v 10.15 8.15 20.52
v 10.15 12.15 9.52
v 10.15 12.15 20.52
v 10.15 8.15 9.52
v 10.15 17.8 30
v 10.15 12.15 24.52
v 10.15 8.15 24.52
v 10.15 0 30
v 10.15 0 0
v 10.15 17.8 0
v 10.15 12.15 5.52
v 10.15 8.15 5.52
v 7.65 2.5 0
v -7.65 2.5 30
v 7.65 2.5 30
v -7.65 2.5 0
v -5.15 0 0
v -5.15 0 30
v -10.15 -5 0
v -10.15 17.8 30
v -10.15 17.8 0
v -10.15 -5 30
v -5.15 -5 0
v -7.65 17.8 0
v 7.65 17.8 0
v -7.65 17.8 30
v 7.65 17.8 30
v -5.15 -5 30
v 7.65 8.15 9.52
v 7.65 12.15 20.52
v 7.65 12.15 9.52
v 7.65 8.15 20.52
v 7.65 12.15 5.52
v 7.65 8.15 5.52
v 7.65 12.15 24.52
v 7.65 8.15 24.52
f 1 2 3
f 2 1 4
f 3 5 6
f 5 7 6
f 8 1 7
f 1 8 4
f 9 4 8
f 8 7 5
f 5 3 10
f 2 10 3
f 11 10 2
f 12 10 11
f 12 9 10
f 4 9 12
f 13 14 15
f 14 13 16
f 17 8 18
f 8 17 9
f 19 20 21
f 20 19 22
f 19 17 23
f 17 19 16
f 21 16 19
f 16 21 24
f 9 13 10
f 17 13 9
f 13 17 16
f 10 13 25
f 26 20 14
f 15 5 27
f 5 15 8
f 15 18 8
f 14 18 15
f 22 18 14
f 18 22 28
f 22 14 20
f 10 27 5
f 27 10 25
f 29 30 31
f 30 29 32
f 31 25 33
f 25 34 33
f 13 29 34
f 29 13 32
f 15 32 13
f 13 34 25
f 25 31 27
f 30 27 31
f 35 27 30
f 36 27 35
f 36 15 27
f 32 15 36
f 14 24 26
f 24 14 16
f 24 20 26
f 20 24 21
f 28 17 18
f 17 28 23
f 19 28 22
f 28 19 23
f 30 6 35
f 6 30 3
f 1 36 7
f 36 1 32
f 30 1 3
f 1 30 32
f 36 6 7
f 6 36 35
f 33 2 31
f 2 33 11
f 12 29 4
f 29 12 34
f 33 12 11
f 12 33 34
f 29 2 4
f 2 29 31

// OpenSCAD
// HomeRacker switch edge bracket - a straight stop flush with one side
// wall, blocking sideways movement off the rail. See
// _homeracker_switch_edge_bracket_lib.scad for the full design notes.
include <_homeracker_switch_edge_bracket_lib.scad>
render_bracket(mirror_piece = false);
